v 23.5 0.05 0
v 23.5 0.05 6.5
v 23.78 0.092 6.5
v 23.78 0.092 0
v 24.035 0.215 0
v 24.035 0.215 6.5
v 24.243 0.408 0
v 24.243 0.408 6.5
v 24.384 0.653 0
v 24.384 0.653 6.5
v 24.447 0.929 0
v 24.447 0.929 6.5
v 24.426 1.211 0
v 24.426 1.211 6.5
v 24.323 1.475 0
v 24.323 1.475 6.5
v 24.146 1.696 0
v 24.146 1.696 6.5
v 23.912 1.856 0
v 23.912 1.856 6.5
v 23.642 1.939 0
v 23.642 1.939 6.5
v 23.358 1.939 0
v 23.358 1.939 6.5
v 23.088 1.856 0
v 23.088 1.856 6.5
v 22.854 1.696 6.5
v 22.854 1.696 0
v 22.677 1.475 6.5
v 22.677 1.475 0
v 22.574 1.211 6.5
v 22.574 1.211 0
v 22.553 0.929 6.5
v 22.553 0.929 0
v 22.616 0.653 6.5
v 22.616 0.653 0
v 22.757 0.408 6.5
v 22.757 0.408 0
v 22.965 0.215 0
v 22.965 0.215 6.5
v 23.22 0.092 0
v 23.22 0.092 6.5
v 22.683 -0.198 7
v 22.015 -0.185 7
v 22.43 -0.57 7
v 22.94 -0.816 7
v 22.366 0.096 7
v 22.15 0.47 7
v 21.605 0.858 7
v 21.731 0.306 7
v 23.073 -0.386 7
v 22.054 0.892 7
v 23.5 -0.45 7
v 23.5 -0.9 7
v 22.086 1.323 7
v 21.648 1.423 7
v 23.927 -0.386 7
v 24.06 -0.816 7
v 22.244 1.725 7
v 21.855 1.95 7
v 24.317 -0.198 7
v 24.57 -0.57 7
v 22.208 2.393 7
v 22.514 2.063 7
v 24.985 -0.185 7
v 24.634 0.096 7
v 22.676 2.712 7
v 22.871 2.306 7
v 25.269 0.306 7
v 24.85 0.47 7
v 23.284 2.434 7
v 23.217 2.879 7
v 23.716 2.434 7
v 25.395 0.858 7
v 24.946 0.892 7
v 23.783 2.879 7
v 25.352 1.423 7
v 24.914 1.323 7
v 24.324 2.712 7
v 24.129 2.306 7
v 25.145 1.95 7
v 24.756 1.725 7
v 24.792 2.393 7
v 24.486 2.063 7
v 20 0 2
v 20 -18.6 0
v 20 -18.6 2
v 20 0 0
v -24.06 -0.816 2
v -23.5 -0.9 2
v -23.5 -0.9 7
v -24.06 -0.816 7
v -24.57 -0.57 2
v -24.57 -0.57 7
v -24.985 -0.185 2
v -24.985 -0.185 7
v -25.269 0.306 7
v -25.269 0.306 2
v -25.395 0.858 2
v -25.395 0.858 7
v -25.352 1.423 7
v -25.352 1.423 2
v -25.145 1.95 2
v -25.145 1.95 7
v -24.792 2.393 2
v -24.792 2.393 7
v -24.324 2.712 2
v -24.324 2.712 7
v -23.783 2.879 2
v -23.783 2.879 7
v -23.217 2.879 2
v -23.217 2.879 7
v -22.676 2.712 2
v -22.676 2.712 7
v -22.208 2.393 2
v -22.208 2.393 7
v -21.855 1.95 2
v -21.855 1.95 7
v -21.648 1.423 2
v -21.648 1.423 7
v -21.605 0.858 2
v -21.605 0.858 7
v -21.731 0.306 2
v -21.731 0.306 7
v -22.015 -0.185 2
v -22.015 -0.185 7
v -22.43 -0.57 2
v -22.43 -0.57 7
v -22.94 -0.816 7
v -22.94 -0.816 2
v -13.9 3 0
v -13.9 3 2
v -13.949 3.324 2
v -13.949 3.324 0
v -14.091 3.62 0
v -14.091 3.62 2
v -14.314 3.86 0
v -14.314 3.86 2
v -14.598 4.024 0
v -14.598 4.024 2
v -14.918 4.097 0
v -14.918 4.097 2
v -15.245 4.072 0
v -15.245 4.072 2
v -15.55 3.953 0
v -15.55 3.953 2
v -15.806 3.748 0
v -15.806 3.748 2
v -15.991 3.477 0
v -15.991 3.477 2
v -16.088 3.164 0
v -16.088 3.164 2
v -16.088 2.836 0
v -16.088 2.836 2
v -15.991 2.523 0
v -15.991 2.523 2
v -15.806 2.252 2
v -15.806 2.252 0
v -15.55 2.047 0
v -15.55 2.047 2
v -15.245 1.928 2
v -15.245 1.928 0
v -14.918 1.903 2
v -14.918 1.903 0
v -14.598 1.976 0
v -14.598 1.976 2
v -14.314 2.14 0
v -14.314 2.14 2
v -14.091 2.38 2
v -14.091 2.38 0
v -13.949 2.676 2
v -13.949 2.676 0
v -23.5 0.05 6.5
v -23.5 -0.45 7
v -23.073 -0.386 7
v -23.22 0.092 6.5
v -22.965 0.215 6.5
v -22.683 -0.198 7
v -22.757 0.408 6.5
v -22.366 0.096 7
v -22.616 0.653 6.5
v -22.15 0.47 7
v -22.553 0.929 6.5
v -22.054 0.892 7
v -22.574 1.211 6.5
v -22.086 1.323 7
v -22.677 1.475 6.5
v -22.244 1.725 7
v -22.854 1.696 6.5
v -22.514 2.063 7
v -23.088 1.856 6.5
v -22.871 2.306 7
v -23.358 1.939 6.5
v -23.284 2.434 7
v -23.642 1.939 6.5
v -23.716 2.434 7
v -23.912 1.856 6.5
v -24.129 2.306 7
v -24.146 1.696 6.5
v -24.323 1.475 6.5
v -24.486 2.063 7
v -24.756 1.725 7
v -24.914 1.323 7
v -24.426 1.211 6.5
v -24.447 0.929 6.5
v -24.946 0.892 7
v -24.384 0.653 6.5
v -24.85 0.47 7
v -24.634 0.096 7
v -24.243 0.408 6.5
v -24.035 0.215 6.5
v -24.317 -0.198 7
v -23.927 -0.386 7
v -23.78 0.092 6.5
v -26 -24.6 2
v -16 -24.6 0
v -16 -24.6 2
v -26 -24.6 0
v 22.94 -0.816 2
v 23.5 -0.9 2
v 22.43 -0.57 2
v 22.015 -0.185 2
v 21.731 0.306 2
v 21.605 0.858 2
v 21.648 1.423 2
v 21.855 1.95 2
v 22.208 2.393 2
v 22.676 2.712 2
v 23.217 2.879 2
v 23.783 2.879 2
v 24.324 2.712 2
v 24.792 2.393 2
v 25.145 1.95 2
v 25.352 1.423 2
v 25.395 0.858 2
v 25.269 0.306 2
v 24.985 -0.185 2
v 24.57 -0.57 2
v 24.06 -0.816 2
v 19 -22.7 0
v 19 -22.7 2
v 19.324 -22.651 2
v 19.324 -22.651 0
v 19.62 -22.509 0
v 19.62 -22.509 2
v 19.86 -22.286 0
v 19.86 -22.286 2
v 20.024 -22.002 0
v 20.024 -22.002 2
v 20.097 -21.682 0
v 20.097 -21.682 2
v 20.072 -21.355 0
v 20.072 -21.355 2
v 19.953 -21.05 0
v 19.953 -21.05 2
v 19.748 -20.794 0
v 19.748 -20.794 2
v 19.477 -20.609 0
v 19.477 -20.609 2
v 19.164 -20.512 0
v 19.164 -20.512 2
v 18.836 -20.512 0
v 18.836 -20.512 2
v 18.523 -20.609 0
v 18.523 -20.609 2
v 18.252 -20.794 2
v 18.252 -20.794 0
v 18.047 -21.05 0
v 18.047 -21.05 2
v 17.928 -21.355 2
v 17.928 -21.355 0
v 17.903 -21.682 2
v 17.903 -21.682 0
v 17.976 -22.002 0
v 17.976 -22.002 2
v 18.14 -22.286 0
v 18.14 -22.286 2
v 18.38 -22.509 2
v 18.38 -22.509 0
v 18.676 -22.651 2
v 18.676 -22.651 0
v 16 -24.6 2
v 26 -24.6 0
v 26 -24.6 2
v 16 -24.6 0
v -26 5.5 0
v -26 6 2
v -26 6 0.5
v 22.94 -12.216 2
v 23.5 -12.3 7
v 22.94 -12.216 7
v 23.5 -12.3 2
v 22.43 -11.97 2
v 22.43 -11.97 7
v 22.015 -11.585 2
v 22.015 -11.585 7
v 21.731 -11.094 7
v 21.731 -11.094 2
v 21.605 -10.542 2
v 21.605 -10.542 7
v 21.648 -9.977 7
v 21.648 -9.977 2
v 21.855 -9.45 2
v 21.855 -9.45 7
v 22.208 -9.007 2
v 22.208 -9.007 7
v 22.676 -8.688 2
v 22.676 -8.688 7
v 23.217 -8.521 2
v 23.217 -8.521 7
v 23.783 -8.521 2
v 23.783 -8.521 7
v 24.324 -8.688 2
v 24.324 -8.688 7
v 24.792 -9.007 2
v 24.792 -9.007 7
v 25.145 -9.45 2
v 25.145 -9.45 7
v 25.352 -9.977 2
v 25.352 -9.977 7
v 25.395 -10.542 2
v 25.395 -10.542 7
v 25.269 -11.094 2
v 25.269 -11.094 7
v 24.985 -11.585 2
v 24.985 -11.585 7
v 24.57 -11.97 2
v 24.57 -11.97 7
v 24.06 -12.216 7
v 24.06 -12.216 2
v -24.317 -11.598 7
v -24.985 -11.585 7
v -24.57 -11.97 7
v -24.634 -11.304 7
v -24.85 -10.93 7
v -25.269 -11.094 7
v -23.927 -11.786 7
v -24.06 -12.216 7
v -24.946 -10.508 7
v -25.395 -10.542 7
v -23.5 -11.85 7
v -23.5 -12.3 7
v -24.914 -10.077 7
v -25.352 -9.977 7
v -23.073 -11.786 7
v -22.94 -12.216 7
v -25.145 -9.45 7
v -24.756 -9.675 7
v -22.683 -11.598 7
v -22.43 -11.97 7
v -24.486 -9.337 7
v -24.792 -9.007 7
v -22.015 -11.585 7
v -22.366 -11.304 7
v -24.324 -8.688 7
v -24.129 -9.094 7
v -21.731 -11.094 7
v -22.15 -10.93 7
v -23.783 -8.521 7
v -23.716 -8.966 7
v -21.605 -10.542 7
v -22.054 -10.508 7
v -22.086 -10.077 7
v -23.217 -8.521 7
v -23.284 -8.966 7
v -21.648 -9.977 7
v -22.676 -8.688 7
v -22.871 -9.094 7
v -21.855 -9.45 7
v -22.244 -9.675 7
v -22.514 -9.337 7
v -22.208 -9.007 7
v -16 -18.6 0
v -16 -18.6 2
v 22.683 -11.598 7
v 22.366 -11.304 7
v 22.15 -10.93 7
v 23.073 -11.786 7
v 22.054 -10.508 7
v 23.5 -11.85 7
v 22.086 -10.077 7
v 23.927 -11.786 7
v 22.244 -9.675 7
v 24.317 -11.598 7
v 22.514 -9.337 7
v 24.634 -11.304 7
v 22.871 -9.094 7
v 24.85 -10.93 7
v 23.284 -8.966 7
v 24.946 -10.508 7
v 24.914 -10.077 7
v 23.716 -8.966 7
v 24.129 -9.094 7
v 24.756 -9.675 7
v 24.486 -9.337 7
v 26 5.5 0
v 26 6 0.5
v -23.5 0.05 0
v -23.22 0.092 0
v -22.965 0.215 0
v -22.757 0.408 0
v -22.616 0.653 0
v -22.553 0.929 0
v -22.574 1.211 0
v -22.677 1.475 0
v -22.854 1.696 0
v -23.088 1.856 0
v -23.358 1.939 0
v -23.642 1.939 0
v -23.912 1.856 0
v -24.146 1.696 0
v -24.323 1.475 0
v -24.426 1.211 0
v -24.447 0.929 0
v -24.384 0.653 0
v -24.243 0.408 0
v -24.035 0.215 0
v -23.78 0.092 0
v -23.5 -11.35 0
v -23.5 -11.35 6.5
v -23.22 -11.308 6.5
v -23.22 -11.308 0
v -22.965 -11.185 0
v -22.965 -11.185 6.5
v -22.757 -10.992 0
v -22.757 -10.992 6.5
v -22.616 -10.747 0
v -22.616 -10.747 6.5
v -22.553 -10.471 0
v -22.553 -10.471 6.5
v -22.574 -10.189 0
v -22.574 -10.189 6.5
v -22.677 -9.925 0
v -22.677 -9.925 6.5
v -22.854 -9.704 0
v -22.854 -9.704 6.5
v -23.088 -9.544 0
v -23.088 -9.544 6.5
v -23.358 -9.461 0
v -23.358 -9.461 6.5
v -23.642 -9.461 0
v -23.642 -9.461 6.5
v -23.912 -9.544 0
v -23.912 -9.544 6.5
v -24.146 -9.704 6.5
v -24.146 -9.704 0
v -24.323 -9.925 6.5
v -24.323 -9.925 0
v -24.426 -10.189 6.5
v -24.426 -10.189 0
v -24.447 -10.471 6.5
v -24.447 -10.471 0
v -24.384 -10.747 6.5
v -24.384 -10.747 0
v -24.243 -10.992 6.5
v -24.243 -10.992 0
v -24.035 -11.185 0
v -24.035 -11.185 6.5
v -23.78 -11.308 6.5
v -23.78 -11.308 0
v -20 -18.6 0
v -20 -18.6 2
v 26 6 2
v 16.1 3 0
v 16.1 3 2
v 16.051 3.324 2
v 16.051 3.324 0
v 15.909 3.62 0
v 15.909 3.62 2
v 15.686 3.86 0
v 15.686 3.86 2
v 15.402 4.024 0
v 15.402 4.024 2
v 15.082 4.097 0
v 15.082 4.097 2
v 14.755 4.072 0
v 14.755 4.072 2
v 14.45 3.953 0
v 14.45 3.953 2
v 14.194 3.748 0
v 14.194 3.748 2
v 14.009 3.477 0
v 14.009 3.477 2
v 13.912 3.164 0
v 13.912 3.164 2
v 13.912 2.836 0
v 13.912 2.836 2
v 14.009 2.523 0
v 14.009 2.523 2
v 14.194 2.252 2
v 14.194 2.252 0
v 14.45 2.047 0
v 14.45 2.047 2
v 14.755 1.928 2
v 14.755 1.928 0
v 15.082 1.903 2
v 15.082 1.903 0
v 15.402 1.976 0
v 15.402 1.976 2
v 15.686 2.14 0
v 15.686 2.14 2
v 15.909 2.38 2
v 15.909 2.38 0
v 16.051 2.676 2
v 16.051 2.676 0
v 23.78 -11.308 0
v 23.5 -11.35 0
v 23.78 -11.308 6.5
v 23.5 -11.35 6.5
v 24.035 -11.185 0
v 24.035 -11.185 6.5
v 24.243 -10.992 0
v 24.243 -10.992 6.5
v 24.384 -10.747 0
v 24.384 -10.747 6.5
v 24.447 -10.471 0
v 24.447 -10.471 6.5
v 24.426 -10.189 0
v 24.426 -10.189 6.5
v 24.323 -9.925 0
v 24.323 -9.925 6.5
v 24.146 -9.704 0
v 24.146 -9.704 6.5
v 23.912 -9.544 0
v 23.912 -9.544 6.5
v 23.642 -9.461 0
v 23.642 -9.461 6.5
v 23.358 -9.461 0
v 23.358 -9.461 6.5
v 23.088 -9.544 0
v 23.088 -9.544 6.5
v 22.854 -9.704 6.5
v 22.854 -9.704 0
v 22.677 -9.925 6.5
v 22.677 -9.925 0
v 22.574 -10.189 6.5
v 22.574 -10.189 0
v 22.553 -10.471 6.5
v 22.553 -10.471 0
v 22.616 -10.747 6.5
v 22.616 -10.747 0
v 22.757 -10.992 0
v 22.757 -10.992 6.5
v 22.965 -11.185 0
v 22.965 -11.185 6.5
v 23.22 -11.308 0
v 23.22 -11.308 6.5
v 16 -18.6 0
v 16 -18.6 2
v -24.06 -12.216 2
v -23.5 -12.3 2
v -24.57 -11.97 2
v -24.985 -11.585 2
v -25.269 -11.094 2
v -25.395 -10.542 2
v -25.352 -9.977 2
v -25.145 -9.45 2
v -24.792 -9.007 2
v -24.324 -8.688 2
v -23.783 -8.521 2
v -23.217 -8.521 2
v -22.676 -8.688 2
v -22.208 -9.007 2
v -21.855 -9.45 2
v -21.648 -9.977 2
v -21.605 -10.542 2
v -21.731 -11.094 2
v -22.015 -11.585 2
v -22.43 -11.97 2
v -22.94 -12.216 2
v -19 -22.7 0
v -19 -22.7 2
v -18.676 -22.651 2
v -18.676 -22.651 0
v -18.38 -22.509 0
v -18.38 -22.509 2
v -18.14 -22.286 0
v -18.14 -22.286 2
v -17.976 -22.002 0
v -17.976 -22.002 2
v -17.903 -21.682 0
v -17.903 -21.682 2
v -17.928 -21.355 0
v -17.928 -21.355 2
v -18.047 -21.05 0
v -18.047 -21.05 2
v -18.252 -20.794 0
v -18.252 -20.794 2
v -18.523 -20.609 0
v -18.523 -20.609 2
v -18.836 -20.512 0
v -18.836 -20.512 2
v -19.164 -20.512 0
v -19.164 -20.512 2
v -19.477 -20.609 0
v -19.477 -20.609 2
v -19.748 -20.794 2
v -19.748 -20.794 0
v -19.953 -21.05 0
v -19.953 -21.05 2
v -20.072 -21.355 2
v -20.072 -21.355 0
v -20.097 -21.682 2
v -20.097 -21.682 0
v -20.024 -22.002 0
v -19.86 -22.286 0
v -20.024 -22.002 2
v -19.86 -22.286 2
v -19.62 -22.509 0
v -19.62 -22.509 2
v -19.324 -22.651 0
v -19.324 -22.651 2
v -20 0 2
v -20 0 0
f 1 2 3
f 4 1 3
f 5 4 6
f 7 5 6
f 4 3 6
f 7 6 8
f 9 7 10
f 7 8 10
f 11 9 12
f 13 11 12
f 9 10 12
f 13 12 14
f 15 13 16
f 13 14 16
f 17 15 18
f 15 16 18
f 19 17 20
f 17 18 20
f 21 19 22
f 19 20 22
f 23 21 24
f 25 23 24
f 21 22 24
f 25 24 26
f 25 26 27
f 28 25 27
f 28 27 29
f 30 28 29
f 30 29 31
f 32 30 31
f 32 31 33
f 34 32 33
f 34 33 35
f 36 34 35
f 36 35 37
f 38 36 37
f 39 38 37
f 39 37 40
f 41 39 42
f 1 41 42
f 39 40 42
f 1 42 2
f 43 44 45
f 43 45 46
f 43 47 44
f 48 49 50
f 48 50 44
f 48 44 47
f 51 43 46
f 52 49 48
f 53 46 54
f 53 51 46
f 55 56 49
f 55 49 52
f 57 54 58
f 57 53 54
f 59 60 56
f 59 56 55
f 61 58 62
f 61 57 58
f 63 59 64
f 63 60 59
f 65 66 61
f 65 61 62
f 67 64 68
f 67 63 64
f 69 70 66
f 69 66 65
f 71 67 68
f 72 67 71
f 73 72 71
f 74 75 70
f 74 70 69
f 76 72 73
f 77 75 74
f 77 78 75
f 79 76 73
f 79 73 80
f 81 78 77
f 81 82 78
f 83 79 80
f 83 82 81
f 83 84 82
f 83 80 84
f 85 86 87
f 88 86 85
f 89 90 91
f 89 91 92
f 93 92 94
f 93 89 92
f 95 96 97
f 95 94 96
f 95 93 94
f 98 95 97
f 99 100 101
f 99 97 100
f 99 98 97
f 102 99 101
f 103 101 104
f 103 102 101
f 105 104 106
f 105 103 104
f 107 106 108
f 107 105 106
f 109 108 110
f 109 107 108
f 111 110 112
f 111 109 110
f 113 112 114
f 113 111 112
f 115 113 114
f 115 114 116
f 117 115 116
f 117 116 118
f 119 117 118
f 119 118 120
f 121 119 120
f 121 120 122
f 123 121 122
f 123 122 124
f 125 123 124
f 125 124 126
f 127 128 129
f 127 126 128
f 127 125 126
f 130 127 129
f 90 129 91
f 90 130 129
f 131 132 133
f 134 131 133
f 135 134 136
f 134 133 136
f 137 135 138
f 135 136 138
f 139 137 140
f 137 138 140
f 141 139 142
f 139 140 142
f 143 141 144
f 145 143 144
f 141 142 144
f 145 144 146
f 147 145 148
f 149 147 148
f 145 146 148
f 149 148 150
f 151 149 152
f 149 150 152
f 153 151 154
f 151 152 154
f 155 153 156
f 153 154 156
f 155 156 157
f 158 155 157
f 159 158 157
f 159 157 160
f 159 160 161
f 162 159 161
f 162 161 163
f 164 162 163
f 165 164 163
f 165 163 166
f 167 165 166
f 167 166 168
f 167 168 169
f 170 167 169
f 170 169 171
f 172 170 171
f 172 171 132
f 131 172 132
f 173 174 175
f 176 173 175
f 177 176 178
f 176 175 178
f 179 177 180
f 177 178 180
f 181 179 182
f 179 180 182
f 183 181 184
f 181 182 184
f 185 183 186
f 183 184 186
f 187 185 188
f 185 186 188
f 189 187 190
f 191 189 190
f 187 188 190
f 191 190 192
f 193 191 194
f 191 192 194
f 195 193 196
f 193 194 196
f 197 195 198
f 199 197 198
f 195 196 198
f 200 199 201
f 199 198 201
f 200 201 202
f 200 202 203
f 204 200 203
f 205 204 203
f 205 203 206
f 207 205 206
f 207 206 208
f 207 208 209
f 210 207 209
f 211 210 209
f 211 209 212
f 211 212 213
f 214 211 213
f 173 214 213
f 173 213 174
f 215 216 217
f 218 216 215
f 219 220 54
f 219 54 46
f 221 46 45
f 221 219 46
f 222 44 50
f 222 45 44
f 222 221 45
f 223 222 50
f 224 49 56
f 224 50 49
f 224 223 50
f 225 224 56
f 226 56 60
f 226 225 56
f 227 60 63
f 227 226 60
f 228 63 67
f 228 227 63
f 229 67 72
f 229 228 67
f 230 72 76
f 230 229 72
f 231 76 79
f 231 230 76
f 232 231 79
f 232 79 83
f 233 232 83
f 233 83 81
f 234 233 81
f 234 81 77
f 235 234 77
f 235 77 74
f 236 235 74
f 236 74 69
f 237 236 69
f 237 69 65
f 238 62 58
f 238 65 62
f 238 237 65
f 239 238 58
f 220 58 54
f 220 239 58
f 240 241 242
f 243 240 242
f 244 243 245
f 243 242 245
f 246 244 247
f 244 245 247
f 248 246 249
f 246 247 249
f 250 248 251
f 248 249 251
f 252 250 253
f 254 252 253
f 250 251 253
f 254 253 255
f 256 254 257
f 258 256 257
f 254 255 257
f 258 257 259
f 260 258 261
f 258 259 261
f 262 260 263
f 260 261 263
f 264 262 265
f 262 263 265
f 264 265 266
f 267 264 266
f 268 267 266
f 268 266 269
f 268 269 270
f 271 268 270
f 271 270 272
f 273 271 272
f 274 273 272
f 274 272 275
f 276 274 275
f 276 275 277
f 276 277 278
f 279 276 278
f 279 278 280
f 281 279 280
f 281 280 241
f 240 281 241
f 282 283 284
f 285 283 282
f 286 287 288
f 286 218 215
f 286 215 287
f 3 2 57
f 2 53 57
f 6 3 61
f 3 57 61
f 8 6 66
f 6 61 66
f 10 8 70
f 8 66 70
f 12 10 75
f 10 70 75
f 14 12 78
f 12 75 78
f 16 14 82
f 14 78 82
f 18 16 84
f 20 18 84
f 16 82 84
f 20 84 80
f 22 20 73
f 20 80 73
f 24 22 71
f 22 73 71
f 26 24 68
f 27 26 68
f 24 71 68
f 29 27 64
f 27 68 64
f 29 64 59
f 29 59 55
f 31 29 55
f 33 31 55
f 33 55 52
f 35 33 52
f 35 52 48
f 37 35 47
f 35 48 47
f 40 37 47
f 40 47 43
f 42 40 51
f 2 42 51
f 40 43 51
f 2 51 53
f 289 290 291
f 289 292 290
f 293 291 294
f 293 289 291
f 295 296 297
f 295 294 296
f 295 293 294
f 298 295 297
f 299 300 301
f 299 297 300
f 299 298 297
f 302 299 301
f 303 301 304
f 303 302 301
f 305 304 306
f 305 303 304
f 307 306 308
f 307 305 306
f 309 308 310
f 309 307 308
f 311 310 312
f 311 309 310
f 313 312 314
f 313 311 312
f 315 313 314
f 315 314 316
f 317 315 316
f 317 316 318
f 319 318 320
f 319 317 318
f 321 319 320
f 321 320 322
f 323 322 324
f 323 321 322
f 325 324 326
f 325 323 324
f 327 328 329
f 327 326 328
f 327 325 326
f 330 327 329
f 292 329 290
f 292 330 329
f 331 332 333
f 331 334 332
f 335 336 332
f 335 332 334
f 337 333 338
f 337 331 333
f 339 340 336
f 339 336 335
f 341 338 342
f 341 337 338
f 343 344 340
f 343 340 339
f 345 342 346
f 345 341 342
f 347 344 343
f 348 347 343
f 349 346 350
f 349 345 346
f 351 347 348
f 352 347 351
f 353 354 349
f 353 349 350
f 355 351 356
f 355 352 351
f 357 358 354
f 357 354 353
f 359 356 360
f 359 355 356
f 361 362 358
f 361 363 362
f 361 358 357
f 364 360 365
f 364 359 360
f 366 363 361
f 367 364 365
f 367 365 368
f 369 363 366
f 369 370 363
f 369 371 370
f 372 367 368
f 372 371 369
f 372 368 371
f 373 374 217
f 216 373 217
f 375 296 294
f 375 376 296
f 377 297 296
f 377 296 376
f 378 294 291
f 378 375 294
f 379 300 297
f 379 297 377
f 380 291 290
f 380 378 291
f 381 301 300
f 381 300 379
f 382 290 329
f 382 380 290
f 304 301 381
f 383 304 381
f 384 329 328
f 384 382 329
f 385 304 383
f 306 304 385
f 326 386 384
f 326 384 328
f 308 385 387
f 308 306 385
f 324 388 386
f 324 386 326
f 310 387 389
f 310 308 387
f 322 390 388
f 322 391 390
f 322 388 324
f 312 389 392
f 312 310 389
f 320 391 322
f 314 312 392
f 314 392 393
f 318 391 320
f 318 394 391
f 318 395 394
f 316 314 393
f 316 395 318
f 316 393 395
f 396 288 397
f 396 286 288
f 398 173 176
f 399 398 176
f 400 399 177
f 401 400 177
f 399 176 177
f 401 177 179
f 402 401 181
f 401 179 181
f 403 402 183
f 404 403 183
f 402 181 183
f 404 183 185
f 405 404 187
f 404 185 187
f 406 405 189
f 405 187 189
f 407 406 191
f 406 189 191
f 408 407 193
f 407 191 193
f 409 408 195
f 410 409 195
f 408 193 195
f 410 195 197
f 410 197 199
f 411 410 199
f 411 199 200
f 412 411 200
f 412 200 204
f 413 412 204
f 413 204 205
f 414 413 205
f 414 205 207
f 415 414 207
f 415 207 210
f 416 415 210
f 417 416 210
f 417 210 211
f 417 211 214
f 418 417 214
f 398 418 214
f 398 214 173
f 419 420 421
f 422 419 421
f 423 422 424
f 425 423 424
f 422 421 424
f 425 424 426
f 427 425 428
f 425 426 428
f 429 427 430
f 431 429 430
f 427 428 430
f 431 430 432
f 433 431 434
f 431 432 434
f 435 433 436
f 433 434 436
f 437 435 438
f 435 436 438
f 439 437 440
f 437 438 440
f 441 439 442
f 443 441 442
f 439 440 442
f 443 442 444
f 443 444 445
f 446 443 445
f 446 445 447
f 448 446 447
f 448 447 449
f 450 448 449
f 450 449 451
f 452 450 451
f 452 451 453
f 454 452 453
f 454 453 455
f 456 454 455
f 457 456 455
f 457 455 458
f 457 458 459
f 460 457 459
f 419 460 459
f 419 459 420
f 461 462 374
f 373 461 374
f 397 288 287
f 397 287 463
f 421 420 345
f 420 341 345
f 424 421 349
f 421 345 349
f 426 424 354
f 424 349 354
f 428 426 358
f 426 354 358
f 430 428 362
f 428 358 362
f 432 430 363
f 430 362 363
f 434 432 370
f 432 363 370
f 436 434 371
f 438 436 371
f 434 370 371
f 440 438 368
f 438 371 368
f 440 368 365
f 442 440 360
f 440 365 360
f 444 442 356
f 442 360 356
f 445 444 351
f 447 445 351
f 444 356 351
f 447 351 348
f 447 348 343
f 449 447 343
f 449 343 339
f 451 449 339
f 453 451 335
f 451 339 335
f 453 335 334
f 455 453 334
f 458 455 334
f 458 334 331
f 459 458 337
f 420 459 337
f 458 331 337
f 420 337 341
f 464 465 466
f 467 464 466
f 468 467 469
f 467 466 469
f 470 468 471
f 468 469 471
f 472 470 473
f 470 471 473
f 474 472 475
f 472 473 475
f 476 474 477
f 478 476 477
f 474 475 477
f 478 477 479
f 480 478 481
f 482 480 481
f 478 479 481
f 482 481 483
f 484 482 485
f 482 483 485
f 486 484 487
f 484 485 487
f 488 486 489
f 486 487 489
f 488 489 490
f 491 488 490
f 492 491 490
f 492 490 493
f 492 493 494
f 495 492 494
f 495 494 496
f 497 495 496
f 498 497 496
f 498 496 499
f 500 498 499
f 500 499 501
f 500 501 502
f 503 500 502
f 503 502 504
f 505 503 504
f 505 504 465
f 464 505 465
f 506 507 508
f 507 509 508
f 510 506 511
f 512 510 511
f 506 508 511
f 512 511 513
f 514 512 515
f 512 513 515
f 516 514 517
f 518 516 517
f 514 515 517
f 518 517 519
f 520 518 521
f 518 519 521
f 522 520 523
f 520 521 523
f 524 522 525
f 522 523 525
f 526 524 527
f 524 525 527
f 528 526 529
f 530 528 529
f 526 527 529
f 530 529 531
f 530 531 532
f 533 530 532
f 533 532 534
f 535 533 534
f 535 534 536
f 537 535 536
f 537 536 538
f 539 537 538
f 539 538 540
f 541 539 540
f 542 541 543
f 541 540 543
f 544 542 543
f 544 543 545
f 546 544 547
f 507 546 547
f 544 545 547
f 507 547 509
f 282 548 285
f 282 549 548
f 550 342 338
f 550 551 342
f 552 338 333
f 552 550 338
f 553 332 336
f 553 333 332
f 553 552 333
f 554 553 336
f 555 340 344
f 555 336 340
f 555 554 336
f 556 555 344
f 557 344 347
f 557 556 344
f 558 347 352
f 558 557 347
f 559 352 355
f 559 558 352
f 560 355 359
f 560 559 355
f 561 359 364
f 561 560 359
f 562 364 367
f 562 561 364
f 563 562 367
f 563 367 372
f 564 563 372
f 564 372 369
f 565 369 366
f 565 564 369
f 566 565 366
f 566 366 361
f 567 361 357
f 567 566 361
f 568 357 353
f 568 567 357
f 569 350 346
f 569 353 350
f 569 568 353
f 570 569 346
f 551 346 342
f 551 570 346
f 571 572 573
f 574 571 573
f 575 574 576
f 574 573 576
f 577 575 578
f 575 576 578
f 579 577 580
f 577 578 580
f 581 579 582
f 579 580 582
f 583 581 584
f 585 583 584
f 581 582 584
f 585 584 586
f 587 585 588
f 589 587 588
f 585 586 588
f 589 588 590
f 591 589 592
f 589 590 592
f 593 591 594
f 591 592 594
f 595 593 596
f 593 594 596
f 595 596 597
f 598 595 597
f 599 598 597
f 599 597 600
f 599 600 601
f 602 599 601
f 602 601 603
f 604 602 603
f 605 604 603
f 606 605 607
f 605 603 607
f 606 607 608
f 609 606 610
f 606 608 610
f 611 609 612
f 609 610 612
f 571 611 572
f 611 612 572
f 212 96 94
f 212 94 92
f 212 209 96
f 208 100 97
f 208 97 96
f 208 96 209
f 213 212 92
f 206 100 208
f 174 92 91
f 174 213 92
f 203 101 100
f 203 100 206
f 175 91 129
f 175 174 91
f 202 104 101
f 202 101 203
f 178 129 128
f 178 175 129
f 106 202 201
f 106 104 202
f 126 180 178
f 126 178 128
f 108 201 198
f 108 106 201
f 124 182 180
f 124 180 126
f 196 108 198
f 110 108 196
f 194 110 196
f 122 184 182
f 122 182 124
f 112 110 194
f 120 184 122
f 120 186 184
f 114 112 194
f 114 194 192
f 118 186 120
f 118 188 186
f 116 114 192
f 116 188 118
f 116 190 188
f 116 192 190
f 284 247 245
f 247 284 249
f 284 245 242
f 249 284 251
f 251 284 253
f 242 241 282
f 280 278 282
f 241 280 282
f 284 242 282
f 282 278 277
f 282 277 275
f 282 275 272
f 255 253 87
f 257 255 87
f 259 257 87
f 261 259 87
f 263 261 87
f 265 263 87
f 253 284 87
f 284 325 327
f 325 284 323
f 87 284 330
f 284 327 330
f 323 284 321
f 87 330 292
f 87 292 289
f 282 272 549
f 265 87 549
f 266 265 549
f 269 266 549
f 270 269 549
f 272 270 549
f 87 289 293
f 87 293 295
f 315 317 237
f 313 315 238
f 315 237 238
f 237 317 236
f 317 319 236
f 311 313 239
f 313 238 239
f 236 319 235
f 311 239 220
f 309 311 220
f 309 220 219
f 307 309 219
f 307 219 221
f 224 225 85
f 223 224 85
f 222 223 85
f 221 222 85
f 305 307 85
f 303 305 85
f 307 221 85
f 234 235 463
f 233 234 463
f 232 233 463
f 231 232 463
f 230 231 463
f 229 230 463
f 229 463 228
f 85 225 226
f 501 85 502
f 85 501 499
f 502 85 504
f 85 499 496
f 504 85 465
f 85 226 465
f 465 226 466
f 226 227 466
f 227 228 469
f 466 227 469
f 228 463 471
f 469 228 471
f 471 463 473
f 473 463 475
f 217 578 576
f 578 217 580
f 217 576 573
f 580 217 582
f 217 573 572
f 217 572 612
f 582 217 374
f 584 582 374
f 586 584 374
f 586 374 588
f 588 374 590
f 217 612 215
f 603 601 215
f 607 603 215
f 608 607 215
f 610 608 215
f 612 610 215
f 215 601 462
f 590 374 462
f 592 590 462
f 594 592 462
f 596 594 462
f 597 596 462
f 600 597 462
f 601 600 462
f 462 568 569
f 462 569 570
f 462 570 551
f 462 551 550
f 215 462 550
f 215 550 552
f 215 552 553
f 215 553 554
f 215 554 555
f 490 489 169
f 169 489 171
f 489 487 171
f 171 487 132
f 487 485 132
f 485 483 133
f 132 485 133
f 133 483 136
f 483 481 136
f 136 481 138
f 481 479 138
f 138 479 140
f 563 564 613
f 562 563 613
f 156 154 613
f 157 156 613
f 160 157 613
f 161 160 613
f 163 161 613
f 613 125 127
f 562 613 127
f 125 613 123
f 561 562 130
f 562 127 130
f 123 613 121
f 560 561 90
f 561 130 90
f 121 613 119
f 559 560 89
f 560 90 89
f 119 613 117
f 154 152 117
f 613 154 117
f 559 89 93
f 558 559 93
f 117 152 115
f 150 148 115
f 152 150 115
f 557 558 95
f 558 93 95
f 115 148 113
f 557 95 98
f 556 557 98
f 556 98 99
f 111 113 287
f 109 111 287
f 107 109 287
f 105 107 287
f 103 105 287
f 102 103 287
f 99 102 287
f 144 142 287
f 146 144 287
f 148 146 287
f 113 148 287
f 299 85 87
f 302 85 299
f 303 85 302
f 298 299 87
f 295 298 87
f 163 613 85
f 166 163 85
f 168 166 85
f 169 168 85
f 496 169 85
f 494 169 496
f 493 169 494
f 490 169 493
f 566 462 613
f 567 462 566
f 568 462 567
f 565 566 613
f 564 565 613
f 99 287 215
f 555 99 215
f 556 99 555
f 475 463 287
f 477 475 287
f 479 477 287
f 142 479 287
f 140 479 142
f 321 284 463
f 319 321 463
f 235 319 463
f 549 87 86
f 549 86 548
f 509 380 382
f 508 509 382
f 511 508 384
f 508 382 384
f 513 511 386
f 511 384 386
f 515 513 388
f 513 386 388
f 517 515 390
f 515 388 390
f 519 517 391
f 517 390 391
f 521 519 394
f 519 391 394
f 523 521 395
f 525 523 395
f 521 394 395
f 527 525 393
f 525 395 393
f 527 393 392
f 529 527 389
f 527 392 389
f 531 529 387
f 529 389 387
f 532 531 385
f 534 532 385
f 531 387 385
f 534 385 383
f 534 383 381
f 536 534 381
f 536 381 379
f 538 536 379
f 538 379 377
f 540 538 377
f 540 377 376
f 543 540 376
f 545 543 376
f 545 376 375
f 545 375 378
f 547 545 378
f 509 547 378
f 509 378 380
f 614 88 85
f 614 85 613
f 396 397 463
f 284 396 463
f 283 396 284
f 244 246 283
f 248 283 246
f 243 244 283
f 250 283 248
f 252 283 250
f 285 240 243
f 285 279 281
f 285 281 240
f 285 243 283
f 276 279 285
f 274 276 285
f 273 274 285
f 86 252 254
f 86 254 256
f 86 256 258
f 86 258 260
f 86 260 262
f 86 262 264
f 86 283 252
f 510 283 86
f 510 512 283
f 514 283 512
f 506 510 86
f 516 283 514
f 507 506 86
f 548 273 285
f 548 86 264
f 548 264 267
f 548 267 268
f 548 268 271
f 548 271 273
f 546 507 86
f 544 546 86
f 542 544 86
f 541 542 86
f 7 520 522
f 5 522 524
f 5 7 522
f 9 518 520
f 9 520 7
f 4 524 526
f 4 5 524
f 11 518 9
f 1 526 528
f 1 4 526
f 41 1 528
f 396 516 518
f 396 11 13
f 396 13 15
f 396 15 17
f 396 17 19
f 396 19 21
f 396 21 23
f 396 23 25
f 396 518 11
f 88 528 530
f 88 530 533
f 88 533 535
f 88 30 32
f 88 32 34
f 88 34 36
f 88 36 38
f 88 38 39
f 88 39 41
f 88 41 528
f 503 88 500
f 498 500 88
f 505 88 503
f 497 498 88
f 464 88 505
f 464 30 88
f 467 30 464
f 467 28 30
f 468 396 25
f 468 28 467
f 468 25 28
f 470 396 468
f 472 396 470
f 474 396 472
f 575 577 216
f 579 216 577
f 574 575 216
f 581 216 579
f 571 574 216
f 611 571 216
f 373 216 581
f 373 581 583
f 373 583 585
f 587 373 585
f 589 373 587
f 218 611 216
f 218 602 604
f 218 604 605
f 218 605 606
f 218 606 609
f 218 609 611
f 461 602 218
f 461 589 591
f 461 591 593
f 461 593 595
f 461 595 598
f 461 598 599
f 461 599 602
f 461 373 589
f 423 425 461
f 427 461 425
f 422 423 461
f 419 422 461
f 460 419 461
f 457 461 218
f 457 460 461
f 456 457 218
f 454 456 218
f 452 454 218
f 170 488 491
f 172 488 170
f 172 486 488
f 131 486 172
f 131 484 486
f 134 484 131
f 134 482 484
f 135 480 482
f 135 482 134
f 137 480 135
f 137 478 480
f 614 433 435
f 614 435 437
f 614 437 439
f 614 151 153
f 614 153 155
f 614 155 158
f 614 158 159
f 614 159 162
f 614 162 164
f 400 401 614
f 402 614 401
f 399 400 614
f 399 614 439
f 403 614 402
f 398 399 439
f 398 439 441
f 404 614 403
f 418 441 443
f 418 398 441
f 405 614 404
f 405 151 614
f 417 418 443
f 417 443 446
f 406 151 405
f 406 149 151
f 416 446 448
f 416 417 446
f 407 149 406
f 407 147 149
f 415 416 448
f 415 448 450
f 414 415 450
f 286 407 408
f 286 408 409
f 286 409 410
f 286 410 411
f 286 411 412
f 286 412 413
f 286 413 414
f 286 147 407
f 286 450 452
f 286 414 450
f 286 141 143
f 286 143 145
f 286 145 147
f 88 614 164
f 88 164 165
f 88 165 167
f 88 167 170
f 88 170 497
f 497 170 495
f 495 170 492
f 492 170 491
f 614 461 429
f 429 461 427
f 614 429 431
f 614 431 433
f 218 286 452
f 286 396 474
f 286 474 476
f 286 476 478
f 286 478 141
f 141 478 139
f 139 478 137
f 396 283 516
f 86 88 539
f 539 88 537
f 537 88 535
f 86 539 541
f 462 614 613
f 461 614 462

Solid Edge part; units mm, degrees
sketch "Sketch1" plane through (0, 0, 0) normal (0, 0, 1) x (1, 0, 0)
  line L0 (-26, 6) -> (26, 6)
  line L1 (26, 6) -> (26, -24.6)
  line L2 (26, -24.6) -> (20, -24.6)
  line L3 (20, -24.6) -> (20, 0)
  line L4 (20, 0) -> (-20, 0)
  line L5 (-20, 0) -> (-20, -24.6)
  line L6 (-20, -24.6) -> (-26, -24.6)
  line L7 (-26, -24.6) -> (-26, 6)
  dimension "D1" = 52
  dimension "D2" = 6
  dimension "D3" = 6
  dimension "D4" = 30.6
extrude "Protrusion1" add sketch "Sketch1" along normal blind 2
sketch "Sketch2" plane through (0, -11, 2) normal (0, 0, 1) x (1, 0, 0)
  circle A0 centre (15, 14) radius 1.1
  circle A1 centre (-15, 14) radius 1.1
  dimension "D1" = 3
  dimension "D2" = 2.2
  dimension "D3" = 30
extrude "Cutout1" cut sketch "Sketch2" against normal through all
chamfer "Chamfer1" distance 0.5 angle 45 1 edges at (0, 6, 0)
sketch "Sketch3" plane through (0, -11, 2) normal (0, 0, 1) x (0, -1, 0)
  circle A0 centre (-12, 23.5) radius 1.9
  circle A1 centre (-0.6, 23.5) radius 1.9
  circle A2 centre (-0.6, -23.5) radius 1.9
  circle A3 centre (-12, -23.5) radius 1.9
  dimension "D1" = 3.8
  dimension "D2" = 11.4
  dimension "D3" = 47
  dimension "D4" = 2.5
  dimension "D5" = 5
extrude "Extrusionsausprägung_2" add sketch "Sketch3" along normal blind 5
sketch "Sketch4" plane through (23.5, 1, 7) normal (0, 0, 1) x (0, -1, 0)
  circle A0 centre (0, 0) radius 0.95
  circle A1 centre (11.4, 0) radius 0.95
  circle A2 centre (0, -47) radius 0.95
  circle A3 centre (11.4, -47) radius 0.95
  dimension "D1" = 1.9
extrude "Cutout2" cut sketch "Sketch4" against normal through all
chamfer "Fase_2" distance 0.5 angle 45 4 edges at (23.5, 1.95, 7) (23.5, -9.45, 7) (-23.5, 1.95, 7) (-23.5, -9.45, 7)
sketch "Sketch5" plane through (0, -9.3, 2) normal (0, 0, 1) x (0, -1, 0)
  line L0 (9.3, -16) -> (15.3, -16)
  line L1 (15.3, -16) -> (15.3, -26)
  line L2 (15.3, -26) -> (3.3, -26)
  line L3 (3.3, -26) -> (3.3, -20)
  line L4 (3.3, -20) -> (9.3, -20)
  line L5 (9.3, -20) -> (9.3, -16)
  line L6 (9.3, 16) -> (15.3, 16)
  line L7 (15.3, 16) -> (15.3, 26)
  line L8 (15.3, 26) -> (3.3, 26)
  line L9 (3.3, 26) -> (3.3, 20)
  line L10 (3.3, 20) -> (9.3, 20)
  line L11 (9.3, 20) -> (9.3, 16)
  dimension "D1" = 10
  dimension "D2" = 6
  dimension "D3" = 12
  dimension "D4" = 12
  dimension "D5" = 10
extrude "Extrusionsausprägung_3" add sketch "Sketch5" against normal blind 2
sketch "Sketch6" plane through (0, -9.3, 2) normal (0, 0, 1) x (0, -1, 0)
  circle A0 centre (12.3, 19) radius 1.1
  circle A1 centre (12.3, -19) radius 1.1
  dimension "D1" = 2.2
  dimension "D2" = 3
  dimension "D3" = 3
extrude "Cutout3" cut sketch "Sketch6" against normal through all
